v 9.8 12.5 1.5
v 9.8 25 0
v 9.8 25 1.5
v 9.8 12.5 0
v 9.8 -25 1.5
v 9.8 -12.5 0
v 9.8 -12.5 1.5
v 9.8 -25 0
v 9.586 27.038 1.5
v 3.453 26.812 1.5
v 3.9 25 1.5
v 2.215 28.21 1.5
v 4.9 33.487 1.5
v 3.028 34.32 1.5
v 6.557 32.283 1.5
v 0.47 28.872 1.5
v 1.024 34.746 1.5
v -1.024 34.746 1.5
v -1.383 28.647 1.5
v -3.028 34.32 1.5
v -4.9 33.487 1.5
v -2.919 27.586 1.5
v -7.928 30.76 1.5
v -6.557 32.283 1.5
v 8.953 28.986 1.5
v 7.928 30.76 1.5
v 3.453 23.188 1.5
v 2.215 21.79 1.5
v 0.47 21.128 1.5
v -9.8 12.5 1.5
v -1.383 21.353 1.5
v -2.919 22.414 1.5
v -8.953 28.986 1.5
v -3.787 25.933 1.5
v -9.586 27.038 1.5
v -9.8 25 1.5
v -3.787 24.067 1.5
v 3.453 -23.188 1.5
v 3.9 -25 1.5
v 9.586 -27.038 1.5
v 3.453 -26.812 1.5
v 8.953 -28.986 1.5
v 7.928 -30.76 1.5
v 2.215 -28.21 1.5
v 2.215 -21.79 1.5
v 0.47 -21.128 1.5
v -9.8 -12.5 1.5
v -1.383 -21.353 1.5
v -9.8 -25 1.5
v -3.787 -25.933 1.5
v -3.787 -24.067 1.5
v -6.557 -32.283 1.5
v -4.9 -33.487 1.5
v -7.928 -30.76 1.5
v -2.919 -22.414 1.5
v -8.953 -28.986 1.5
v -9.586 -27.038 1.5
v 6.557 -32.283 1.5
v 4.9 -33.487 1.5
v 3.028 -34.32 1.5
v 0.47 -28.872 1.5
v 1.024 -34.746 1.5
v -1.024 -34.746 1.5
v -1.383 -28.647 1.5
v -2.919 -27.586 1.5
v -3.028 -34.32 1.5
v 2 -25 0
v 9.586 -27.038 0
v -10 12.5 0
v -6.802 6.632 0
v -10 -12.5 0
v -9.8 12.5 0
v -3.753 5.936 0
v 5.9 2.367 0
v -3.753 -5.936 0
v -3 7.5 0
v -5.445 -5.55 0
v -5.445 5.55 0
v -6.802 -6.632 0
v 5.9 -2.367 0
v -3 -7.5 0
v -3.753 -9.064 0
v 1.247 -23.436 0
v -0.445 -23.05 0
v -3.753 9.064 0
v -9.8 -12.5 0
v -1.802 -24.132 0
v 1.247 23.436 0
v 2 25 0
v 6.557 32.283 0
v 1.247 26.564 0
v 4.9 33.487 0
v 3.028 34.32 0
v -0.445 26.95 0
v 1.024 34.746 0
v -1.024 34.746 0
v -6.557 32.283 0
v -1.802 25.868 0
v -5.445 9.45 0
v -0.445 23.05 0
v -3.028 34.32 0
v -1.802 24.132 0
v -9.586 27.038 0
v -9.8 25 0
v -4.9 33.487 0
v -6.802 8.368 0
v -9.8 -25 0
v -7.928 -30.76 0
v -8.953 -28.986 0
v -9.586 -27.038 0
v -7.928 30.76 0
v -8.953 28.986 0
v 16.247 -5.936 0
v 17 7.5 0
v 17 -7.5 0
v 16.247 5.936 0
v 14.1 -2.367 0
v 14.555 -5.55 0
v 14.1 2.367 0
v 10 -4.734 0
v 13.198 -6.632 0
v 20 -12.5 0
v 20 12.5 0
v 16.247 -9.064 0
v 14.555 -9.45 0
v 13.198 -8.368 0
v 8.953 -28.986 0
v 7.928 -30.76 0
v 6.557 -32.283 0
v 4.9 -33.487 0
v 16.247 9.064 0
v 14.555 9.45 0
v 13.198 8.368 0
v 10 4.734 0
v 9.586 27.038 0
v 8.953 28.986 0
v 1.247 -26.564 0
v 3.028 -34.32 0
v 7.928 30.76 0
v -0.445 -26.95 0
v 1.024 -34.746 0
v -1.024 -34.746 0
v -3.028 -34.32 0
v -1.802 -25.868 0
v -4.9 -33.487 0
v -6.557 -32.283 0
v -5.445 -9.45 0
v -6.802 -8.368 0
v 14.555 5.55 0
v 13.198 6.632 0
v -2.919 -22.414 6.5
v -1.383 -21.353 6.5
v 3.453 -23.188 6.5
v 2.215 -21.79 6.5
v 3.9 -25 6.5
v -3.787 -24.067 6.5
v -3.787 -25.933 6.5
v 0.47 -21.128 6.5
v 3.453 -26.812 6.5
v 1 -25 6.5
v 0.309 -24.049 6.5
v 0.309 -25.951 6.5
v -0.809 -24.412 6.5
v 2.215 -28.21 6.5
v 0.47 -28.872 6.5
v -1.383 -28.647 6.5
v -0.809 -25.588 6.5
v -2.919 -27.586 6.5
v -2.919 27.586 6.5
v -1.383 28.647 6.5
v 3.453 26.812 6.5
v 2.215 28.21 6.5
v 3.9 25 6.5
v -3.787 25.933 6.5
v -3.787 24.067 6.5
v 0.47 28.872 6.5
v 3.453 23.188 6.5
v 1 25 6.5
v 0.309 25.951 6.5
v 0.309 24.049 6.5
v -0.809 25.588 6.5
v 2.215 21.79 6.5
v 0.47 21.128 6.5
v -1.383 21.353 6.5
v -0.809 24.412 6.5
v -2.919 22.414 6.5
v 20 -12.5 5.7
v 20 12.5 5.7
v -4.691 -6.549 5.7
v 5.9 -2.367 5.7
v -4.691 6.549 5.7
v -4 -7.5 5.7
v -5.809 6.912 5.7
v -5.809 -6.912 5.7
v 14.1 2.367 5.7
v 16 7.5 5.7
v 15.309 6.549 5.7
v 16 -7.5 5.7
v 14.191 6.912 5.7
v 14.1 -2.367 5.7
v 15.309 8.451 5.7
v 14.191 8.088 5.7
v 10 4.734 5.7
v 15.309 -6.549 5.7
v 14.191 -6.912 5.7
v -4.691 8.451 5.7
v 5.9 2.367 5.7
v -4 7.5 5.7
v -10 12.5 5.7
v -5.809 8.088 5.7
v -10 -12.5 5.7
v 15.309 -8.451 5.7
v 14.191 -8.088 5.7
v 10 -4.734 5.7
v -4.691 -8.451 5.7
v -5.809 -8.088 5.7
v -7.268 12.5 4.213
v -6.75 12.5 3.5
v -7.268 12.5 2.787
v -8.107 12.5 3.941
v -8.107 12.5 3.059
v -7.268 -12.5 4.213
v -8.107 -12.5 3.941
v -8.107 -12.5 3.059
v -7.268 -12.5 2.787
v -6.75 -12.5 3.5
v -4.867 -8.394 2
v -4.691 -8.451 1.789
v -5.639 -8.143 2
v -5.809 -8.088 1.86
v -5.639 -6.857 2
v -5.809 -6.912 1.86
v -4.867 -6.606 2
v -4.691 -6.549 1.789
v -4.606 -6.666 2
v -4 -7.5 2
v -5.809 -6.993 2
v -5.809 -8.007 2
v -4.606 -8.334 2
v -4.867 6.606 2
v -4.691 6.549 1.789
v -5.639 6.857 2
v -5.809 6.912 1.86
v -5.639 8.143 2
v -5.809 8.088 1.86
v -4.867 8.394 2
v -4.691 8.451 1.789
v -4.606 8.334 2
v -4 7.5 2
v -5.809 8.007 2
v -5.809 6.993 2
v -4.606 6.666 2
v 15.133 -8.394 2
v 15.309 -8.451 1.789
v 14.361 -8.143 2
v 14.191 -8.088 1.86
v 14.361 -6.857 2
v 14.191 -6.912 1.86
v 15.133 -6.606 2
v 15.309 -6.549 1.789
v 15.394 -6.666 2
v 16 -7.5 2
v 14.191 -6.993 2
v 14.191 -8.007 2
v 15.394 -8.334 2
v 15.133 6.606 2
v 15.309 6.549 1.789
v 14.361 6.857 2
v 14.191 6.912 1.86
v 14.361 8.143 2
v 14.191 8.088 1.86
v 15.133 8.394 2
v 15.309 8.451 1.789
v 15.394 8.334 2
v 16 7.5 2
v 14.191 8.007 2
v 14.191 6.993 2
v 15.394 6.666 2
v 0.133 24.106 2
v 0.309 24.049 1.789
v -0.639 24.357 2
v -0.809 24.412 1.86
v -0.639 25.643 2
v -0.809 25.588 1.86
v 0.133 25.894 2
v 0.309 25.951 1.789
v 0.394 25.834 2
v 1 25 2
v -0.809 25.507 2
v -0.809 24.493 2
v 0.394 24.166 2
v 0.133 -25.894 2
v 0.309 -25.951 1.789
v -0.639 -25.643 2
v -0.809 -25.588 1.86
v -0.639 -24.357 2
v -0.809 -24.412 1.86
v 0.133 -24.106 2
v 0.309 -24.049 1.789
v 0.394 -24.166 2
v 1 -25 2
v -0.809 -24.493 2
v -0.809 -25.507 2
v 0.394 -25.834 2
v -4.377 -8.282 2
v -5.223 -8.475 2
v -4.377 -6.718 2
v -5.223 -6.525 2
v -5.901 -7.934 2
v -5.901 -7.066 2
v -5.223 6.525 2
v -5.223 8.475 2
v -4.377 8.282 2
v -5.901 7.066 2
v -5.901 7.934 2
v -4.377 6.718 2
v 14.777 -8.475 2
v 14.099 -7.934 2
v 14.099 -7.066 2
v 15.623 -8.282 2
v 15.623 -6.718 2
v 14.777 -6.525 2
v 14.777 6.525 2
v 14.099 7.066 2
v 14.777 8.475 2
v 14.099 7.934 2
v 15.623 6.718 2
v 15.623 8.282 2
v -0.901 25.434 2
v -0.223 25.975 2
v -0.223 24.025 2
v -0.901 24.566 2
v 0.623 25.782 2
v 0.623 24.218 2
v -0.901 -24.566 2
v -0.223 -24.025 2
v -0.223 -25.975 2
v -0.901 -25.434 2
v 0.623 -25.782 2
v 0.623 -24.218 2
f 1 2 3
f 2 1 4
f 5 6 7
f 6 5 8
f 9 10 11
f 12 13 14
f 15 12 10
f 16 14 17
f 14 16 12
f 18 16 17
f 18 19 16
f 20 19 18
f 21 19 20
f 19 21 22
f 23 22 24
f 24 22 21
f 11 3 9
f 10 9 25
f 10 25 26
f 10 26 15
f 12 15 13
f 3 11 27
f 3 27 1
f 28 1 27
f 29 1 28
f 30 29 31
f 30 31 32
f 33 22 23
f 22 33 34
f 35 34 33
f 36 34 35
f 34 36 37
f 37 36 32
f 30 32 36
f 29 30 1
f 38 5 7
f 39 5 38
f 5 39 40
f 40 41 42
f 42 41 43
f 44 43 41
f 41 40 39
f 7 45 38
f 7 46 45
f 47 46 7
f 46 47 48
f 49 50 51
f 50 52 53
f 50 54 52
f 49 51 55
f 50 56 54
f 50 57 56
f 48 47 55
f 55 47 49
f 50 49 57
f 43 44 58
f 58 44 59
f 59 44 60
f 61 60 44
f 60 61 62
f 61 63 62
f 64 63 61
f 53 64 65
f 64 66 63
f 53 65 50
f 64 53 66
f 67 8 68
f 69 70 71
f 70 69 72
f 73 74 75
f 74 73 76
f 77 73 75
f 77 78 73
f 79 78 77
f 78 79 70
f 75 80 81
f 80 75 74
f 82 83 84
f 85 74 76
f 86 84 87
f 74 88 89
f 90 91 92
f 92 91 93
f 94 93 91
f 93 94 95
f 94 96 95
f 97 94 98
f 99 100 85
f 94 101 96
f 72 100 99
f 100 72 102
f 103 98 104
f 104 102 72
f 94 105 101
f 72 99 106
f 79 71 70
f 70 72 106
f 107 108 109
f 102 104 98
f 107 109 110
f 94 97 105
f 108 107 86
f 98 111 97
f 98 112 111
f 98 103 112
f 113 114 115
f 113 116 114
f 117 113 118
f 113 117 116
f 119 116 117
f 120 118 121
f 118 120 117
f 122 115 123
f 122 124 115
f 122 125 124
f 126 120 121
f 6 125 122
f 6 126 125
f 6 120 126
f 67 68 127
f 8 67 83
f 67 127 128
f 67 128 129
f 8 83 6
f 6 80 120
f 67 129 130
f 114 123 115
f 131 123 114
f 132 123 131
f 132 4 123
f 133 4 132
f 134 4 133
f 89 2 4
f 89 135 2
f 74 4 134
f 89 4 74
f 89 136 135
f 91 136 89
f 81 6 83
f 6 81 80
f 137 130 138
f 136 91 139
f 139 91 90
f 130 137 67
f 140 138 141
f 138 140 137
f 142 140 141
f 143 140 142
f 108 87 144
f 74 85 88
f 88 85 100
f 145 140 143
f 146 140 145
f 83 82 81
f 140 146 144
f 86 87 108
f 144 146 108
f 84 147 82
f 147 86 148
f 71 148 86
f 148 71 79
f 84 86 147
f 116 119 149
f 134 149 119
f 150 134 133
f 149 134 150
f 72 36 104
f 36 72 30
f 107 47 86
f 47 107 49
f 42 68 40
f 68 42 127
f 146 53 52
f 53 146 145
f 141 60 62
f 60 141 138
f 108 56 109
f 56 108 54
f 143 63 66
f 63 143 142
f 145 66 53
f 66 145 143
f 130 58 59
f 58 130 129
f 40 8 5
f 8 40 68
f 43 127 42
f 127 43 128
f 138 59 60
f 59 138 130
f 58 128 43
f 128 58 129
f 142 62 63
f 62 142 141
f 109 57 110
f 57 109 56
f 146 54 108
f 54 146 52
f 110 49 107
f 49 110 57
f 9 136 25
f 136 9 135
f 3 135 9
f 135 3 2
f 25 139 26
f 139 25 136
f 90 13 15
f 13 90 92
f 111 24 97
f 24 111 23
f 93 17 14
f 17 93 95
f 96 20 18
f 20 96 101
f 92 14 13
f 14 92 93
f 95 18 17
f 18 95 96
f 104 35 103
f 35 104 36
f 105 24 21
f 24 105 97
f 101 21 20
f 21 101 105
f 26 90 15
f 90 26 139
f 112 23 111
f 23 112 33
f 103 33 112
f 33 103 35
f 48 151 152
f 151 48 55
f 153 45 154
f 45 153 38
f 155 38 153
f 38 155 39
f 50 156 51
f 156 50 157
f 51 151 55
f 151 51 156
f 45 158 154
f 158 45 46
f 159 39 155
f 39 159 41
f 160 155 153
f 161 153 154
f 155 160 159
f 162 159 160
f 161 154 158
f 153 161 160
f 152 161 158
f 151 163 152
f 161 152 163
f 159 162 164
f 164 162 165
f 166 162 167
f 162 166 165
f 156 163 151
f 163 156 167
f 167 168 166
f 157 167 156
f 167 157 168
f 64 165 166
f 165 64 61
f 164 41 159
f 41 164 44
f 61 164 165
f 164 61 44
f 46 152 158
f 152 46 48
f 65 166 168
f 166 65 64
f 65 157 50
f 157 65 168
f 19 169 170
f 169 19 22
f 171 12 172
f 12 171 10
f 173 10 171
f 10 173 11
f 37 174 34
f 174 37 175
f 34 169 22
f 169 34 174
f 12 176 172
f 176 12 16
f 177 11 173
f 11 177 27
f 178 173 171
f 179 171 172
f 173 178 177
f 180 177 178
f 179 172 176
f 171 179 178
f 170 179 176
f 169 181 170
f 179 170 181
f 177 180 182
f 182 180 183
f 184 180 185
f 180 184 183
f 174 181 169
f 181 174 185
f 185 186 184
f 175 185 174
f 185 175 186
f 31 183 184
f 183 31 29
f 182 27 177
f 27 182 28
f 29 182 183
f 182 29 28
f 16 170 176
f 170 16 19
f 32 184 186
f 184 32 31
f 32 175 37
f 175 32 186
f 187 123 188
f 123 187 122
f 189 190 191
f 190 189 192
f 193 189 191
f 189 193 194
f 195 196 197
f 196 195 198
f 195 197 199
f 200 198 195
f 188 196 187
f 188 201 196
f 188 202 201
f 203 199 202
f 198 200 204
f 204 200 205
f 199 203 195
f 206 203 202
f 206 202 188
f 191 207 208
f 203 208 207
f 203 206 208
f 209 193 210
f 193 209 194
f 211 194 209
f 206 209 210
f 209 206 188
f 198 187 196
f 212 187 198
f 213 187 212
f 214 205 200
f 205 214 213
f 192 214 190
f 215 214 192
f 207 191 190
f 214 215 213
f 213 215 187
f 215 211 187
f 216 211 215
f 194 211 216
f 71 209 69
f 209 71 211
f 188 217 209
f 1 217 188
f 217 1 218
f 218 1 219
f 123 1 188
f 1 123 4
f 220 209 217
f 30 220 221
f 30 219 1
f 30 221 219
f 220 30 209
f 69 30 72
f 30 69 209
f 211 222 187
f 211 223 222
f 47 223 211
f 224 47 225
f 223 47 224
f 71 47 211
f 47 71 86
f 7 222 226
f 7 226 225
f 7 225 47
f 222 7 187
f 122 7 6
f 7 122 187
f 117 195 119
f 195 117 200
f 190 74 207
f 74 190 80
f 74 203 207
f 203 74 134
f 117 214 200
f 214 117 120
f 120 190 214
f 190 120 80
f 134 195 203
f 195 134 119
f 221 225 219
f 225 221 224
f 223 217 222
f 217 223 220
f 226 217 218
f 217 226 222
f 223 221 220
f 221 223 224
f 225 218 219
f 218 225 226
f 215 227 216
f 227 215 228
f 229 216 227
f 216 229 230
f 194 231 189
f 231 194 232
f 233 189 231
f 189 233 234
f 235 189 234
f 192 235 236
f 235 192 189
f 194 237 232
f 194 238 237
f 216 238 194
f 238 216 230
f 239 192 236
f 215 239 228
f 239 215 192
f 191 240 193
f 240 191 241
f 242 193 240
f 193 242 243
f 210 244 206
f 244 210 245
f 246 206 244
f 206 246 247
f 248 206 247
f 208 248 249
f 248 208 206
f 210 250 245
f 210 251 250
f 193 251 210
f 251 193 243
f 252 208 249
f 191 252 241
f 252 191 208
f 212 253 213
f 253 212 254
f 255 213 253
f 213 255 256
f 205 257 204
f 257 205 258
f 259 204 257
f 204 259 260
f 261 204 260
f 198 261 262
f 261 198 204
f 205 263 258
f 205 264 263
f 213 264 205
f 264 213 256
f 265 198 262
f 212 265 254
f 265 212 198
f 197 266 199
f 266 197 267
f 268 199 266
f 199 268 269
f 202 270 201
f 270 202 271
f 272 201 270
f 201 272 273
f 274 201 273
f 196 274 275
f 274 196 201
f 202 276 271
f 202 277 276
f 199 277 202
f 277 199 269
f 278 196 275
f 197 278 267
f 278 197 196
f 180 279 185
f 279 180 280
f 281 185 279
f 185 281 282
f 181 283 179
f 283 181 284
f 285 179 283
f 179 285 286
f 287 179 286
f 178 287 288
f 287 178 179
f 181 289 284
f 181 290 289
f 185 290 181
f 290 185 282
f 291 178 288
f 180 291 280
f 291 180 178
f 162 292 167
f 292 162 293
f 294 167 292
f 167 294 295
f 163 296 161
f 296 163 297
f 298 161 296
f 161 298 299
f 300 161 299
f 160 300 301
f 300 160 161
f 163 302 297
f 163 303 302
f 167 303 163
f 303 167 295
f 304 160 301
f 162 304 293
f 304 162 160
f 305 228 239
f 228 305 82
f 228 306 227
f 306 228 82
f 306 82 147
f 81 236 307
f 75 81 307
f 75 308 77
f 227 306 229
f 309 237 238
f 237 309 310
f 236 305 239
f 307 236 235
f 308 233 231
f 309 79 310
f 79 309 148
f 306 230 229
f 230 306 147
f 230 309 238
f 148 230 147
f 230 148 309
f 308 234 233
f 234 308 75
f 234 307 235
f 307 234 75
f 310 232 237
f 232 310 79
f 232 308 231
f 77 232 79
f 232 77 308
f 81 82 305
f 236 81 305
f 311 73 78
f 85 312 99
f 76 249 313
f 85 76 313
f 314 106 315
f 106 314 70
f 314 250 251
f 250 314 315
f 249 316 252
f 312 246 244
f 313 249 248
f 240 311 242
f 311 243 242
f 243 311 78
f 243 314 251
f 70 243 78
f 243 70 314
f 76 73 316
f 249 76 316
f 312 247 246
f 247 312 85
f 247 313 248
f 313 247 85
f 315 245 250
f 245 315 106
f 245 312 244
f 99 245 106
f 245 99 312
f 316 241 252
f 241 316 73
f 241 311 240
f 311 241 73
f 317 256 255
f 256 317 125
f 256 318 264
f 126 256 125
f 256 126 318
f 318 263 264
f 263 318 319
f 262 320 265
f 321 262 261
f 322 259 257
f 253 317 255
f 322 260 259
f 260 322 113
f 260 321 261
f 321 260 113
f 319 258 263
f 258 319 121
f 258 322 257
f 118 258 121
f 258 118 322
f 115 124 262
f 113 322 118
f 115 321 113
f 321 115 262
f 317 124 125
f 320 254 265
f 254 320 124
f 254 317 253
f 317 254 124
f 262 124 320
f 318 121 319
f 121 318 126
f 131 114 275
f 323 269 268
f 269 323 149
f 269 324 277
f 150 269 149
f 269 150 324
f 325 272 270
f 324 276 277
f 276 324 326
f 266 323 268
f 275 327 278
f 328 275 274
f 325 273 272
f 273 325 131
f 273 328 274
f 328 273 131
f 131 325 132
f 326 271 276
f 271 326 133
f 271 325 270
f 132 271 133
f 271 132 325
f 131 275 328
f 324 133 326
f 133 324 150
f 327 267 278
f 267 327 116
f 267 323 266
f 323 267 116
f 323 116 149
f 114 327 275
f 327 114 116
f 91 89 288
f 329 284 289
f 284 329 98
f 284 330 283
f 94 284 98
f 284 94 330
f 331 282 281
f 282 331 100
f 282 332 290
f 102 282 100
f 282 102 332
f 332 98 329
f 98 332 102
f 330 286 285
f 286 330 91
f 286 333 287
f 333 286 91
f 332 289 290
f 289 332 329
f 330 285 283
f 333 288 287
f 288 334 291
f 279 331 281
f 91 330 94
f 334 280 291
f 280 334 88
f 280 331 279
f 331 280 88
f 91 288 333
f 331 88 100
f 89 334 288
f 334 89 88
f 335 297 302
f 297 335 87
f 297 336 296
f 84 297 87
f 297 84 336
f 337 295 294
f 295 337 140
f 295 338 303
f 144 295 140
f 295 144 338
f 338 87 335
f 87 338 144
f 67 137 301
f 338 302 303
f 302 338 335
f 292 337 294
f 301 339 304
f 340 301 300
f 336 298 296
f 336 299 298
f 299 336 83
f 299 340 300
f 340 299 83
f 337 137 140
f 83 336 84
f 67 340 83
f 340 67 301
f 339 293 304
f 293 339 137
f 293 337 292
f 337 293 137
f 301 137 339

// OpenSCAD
// file: config_4x5.scad
/*
This is the base configuration file for the 4x5" format
# we are not using the exact ANSI measures, but slightly rounded measures for slight simplification
*/
vStabilizerTotal_h = 7;

// general tolerance
vTolerance = 0.2;

// sheet film and cassette measurements (roughly based on the ANSI measurements)
vFilmSheet_l = 127;
vFilmSheet_w = 102;
vCassette_l = 160; // A min
vCassette_w = 121; // B max
vCassette_h = 13.2; // C max
vLightTrap_l = 2; // M2
vLightTrap_w = vCassette_w;
vLightTrap_h = 1.5; // M1
vLightTrap_offsetX = 141; // G max
vFilmWindow_l = 121;
vFilmWindow_w = 101;
vFilmWindow_offsetX = 16;
vGroundGlass_offsetZ = 5;

// Graflok
vGraflok_h = 6; // this is not the official measurement, just measured from a camera 

// lens board measures (we are using Wista/Technika-style lensboards)
vLensboard_l = 100;
vLensboard_w = 97;
vLensboard_h = 2;
vLensboard_offsetX = -(vLensboard_l+3)/2; // caution: we have an asymetric offset!
vLensboard_offsetY = -vLensboard_w/2;
vLensboardHole_d = 85;
vLensboardLighttrap_d = 89;
vLensboardLighttrap_h = 1+vTolerance;

// bellows frame measures - the bellows frame design is derived from standardcameras.com
// back frame
vBellowsBackInner_l = 144; //???? check and replace with the measurement from your bellows!
vBellowsBackInner_w = vBellowsBackInner_l;
vBellowsBackOuter_l = vBellowsBackInner_l+1;
vBellowsBackOuter_w = vBellowsBackOuter_l;

vBellowsBackFrameOuter_l = 159;
vBellowsBackFrameOuter_w = vBellowsBackFrameOuter_l;
vBellowsBackFrameOuter_h = 7;
vBellowsBackFrameInner_l = 135;
vBellowsBackFrameInner_w = vBellowsBackFrameInner_l;
vBellowsBackFrameInner_h = 5;

vBellowsBackLightTrapOuter_l = vBellowsBackFrameInner_l+2*2;
vBellowsBackLightTrapOuter_w = vBellowsBackLightTrapOuter_l;
vBellowsBackLightTrap_h = 3;

vBellowsBackFrameScrewHole_d = 2;
vBellowsBackFrameScrewHole_h = 10;
vBellowsBackFrameScrewHole_offsetXY = 70;
vBellowsBackFrameScrewHole_offsetZ = vBellowsBackFrameOuter_h/2;

// front frame
vBellowsFrontInner_l = 94; //???? check and replace with the measurement from your bellows!
vBellowsFrontInner_w = vBellowsFrontInner_l;
vBellowsFrontOuter_l = vBellowsFrontInner_l+1;
vBellowsFrontOuter_w = vBellowsFrontOuter_l;

vBellowsFrontFrameOuter_l = 104;
vBellowsFrontFrameOuter_w = vBellowsFrontFrameOuter_l;
vBellowsFrontFrameOuter_h = 7;
vBellowsFrontFrameInner_l = 82;
vBellowsFrontFrameInner_w = vBellowsFrontFrameInner_l;
vBellowsFrontFrameInner_h = 5;

vBellowsFrontLightTrapOuter_l = vBellowsFrontFrameInner_l+2*2;
vBellowsFrontLightTrapOuter_w = vBellowsFrontLightTrapOuter_l;
vBellowsFrontLightTrap_h = 0;

vBellowsFrontFrameScrewHole_d = 2;
vBellowsFrontFrameScrewHole_h = 10;
vBellowsFrontFrameScrewHole_offsetXY = 40;
vBellowsFrontFrameScrewHole_offsetZ = vBellowsFrontFrameOuter_h/2;

// body dimensions
vWall_strength = 5;
vBodyOuter_l = 185; // make sure this is at least 4*vWall_strength larger than vBellowsBackFrameOuter_l!
vBodyOuter_w = 170; // make sure this is at least 2*vWall_strength larger than vBellowsBackFrameOuter_l!
vBodyOuter_h = 65;
vBodyEdge_r = vWall_strength;

// we will center our model on the Y axis and on the center of the bellows frame
// at least for the 4x5 version, we have to do an asymetric offset of 2.5mm on the X-axis 
vAsymOffsetX = -2.5;  

// back plate
vBackPlateLength = 160; // we will probably use about the same size as the bellows back frame
vBackPlateStrength = vWall_strength;

// hinges for front lid
vHingeInnerDistance = 100;
vHingeBaseWidth = 20;
vHingeHole = 5;

// lid lock measures
vLidLockBase_d = 8;
vLidLockHole_distance = 70;

// rail dimensions
vLowerRail_w = 90;
vUpperRail_w = vLowerRail_w;

// cutout for stop indents
vStopIndent_l = 4;
vStopIndent_h = 5;
vStopIndentDistance = 25; // shorter than 25 is not necessary
vStopIndent_offsetX = 20; // don't go shorter than 20 if you intend to use a 90mm lens!

// for all dovetails we use a base width of 5mm and a base height of 5mm
// we are applying tolerances to the inner AND outer part of a dovetail, in width and height
vDoveTail_w = 5;
vDoveTail_h = 5;
vDoveTail_tolerance = 0.2;

// front standard carrier / slider
// width is depending on vUpperRail_w
vSliderBase_w = vUpperRail_w + (4*vDoveTail_w);
vSliderBase_l = 40; // make sure to have enough space in the body.


// lever plate 
vLeverPlateBase_w = vUpperRail_w - (8*vDoveTail_w);
vLeverPlateBlock_w = 25;
vLeverPlateBlock_l = vSliderBase_l-(2*vDoveTail_w);

vFrontStandard_h = 130;
vFrontStandardSlot_h = vFrontStandard_h - 30;

// lensboard carrier
vFrontPlate_length = vSliderBase_w+6; // vSliderBase_w is a bit too tight for 4x5", so there we will add 5mm, for 5x7 vSliderBase_w is OK to get a squared lensboard carrier
vFrontPlate_width = vSliderBase_w; //vFrontPlate_length;
vFrontPlate_height = 16;
vEdgeCutCylinder = floor(sqrt(2*pow(vFrontPlate_width,2)))-5;

vTiltDovetailBase_d1 = 30;
vTiltDovetailBase_d2 = vTiltDovetailBase_d1+(2*vDoveTail_w);
vTiltDovetailBaseBlock_d = vTiltDovetailBase_d1+(4*vDoveTail_w);

vTiltDovetail_d1 = vTiltDovetailBase_d1-vTolerance;
vTiltDovetail_d2 = vTiltDovetailBase_d2-vTolerance;
vTiltDovetail_h = vDoveTail_w-vTolerance;

vTiltDovetailCutout_d1 = vTiltDovetailBase_d2+vTolerance;
vTiltDovetailCutout_d2 = vTiltDovetailBase_d1+vTolerance;

vAxisHole_d = 10+vTolerance;
vAxisHole_h = vDoveTail_w+vTolerance;

vTiltLockBolt_d = 12;
vTiltLockBolt_h = 14;
vTiltLockBoltHole_d = 8;
vTiltLockBoltHole_h = vTiltLockBolt_h;

vTiltHeight = 50;
vTiltRadius = vFrontPlate_length/2;
vTiltAngleMinus = -7;
vTiltAnglePlus = 7;
vTiltAxis_d = 10-vTolerance;

// focusing rod
vFocusingRod_d = 6;
vFocusingKnob_d = 25;
vFocusingKnob_h = 20;

// stabilizer measures (just the outer measures of our stabilizer block, not the tripod slider)
vStabilizerBase_l = 135;
vStabilizerBase_w = 90;  
vStabilizerBase_h = 7;
vStabilizerDovetailBase_w = 50;
// screw holes for the stabilizer
vLidHoleCount_x = 4;
vLidHoleDist_x = 35;
vLidHoleCount_y = 2;
vLidHoleDist_y = 60;


// screw diameters, length is individually set
vScrew1Hole_d = 3;
vScrew1ThreadHole_d = 2.2;
vScrew2Hole_d = 2;
vScrew2ThreadHole_d = 1.4;


 
// file: modules.scad
/*
This is a collection of the modules which are used heavily within the whole project.
Almost all parts rely on the modules to remain "as is", especially regarding their current orientation.
So please act very carefully here, otherwise you may screw up the complete design!

*/
include <baseconfig.scad>;


// roof module - this is heavily used for dovetail cutouts
// please keep as is
module roof(l, w, h){
    polyhedron(
        points=[
            [0,0,0],
            [l,0,0],
            [l,w,0],
            [0,w,0],
            [0,w/2,h],
            [l,w/2,h]
            ],
        faces=[
            [0,1,2,3],
            [0,4,1],
            [1,4,5,2],
            [2,5,3],
            [3,5,4,0]
            ]
            );
    };

// a wedge module - this is heavily used for cutting edges
// please keep as is    
module wedge(l, w, h) {
    polyhedron(
            points=[
                [0,0,0],
                [l,0,0],
                [l,w,0],
                [0,w,0],
                [0,0,h],
                [l,0,h]
            ],
            faces=[
                [0,3,2,1],
                [0,1,5,4],
                [1,2,5],
                [2,3,4,5],
                [3,0,4]
            ]
    );
   };

// simple tube module.   
module tube(d1, d2, h) {
    difference() {
        cylinder(d=d1, h=h);
        cylinder(d=d2, h=h);
        };
    };

// mainly used for making holes for countersunk screws
// please keep as is    
module countersunk_screw(vScrew_d, vScrew_l){
    union(){
    cylinder(d=vScrew_d, h=vScrew_l);
    cylinder(d1=vScrew_d*2, d2=0, h=vScrew_d);
    };
};

// module for making hexagons, e.g. hex nuts. kw is the key width
// please keep as is
module hex(kw, h) {
	render()
        translate([0, 0, h/2])
            intersection_for(a = [0, 120, 240]) {
                rotate([0, 0, a])
                    cube([kw, 3 * kw, h], true);
                }
}


// Heatset insert
// d: Thread diameter
// od: Outer diameter
// l: Total length
module insert(d, od, l)
{
    echo(Insert = d, od, l);
    difference() {
        cylinder(l, d=od, $fn=15);
        translate([0, 0, -0.5]) cylinder(l+1, d=d, $fn=15);
        };
}

module insert_m2()
{
    color("gold") insert(2, vInsertM2Size_d, vInsertM2Depth_h);
}

module insert_m3()
{
    color("gold") insert(3, vInsertM3Size_d, vInsertM3Depth_h);
}

module insert_m5()
{
    color("gold") insert(5, vInsertM5Size_d, vInsertM5Depth_h);
}

// Countersunk screw, metric, for display
// Example: https://www.aliexpress.com/item/1005007838338973.html
module screw_cs(l, d=3, dk=6, s=2, t=1) {
    // l: total length (including head) in mm
    // d: thread diameter (eg 3 for M3)
    // dk: max head diameter
    // s: hex socket flat-to-flat size
    // t: hex socket depth
    echo(CountersunkScrew = d, l);
    difference() {
        union() {
            cylinder(h=l, r=d/2, $fn=15);
            cylinder(h=(dk-d)/2, r1=dk/2, r2=d/2, $fn=15);
            }
        cylinder(h=t, r=s/2*2/sqrt(3), $fn=6);
    }
}

module screw_m3_cs(l) {
    color("silver") screw_cs(l, d=3, dk=6, s=2, t=1);
}

module screw_m2_cs(l) {
    color("silver") screw_cs(l, d=2, dk=3.8, s=1.5, t=0.75);
}
module screw_m5_cs(l) {
    color("silver") screw_cs(l, d=5, dk=9.5, s=3, t=1.6);
}

// Button head screw, metric, for display
// Example: https://www.aliexpress.com/item/32967225441.html
module screw_bh(l, d=3, k=1.5, dk=5.5, s=2, t=1) {
    // l: shaft length (NOT including head) in mm
    // d: thread diameter (eg 3 for M3)
    // k: head depth
    // dk: head max diameter
    // s: hex socket flat-to-flat size
    // t: hex socket depth
    echo(BallheadScrew = d, l);
    difference() {
        union() {
            translate([0, 0, k]) cylinder(h=l, r=d/2, $fn=15);
            difference() {
                translate([0, 0, k]) intersection() {
                    sphere(d=dk, $fn=15);
                    translate([-dk/2, -dk/2, -dk]) cube(dk);
                }
                translate([-dk/2, -dk/2, -dk]) cube(dk);
            }
        }
        cylinder(h=t, r=s/2*2/sqrt(3), $fn=6);
    }
}

module screw_m2_bh(l) {
    color("silver") screw_bh(l, d=2, dk=3.4, s=1.175, t=0.6);
}

module screw_m3_bh(l) {
    color("silver") screw_bh(l, d=3, dk=5.7, s=2, t=1);
}


module nut_m5() {
    echo(Nut = 5);
    difference() {
        rotate([0, 0, 30]) cylinder(h=3.9, d=8*2/sqrt(3), $fn=6);
        cylinder(h=5, d=5, $fn=15);
        }
    }
    
    
module thumbscrew(bolt_d, bolt_dk, screw_d, screw_h, n_knurls, knurl_d, knurl_f) {
    // bolt_d:  central bolt diameter
    // bolt_dk: bolt head max diameter
    // screw_d: thumbscrew outer diameter
    // screw_h: thumbscrew height
    // n_knurls: number of knurls
    
    min_knurl_offset = screw_d/2 - knurl_d;
    max_knurl_offset = screw_d/2 + knurl_d;
    knurl_offset = min_knurl_offset + knurl_f*(max_knurl_offset - min_knurl_offset);
    
    difference()
    {
        union()
        {
            translate([0, 0, 1]) cylinder(screw_h-2, d=screw_d);
            cylinder(1, d1=screw_d-1, d2=screw_d);
            translate([0, 0, screw_h-1]) cylinder(1, d1=screw_d, d2=screw_d-1);
        }
        cylinder(screw_h, d=bolt_d);
        cylinder(bolt_dk/2, d1=bolt_dk, d2=0);
        for (i = [1:n_knurls])
        {
            rotate([0, 0, i*360/(n_knurls)]) translate([knurl_offset, 0, 0]) cylinder(screw_h, d=knurl_d);
        }
    }
}

module thumbscrew_m5(screw_d, screw_h, n_knurls, knurl_d, knurl_f) {
    thumbscrew(5, 9.5, screw_d, screw_h, n_knurls, knurl_d, knurl_f);
}


module t6_flange_coupler() {
    // T6 flange coupler
    // Example: https://www.aliexpress.com/item/1005008049363389.html
    echo(FlangeCoupler = 6);
    difference() {
        union() {
            translate([0, 0, 2]) cylinder(h=10, d=10);
            cylinder(h=2, d=22);
        }
        cylinder(h=12, d=6);
        translate([0, 15, 7]) rotate([90, 0, 0]) cylinder(h=30, d=3);
        for (i = [0:3]) {
            rotate([0, 0, 45+90*i]) translate([-8, 0, 0]) cylinder(h=2, d=3);
        }
    }
}


module AXK0619_thrust_bearing() {
    echo(ThrustBearing = "AXK0619");
    difference() {
        cylinder(h=4, d=19);
        cylinder(h=4, d=6);
    }
}


module t6_lead_screw(l) {
    echo(LeadScrewT6 = l);
    color("silver") cylinder(h=l, d=6);
}

module t6_lead_screw_nut() {
    echo("LeadScrewT6Nut");
    intersection()
    {
        difference() {
            union() {
                cylinder(h=15, d=12);
                translate([0, 0, 1.5]) cylinder(h=3.5, d=24);
            }
            cylinder(h=15, d=6);
        }  
        translate([-50, -12.5/2, -50]) cube([100, 12.5, 100]);
    }
}

module m5_rod(l) {
    echo(ThreadedRodM5 = l);
    color("silver") cylinder(h=l, d=5);
}


module screw_m3_grub(l) {
    echo(GrubScrew = 3, l);
    cylinder(h=l, d=3, $fn=15);
}
// file: baseconfig.scad
/*
Here we define some variables which are independent from the camera format
*/


// some generic variables

// we are including a format specific configuration sheet - but make sure to include only one!

include <config_4x5.scad>;
// include <config_5x7.scad>;
// include <config_8x10.scad>;

// Arca Swiss tripod plate
// caution: some Arca Swiss compatible tripod heads may have slight variations
// vArca_length = xx; // the length is irrelevant here
vArca_width = 38;
vArca_height = 7;
vArcaBase_cutout = 4;
vArcaBase_height = 1.5;
// main file
// loading the base configuration
include <baseconfig.scad>;

// some modules such as hex, countersunk screws, roof, wedge are available in a module file
use <modules.scad>;


module pulling_lever_plate() {

vBoltPlate_length = 20-(2*vTolerance);
vBoltPlate_width = vLeverPlateBase_w; // caution: this is just the width without the radius!
vBoltPlate_height = 1.5;
vBoltPlate_offsetX = -vBoltPlate_length/2;
vBoltPlate_offsetY = -vBoltPlate_width/2;
vBoltPlate_offsetZ = 0;

vBolt_diameter = 8-vTolerance;
vBolt_height = vBoltPlate_height+5;
vBolt_offsetX = 0;
vBolt_offsetY = vBoltPlate_offsetY;
vBolt_offsetZ = 0;

vCentralBlock_length = vLeverPlateBlock_l;
vCentralBlock_width = vLeverPlateBlock_w;
vCentralBlock_height = vBoltPlate_height+4+vTolerance;
vCentralBlock_offsetX = vLeverPlateBlock_l-vSliderBase_l; // this should result in a negative offset
vCentralBlock_offsetY = -vCentralBlock_width/2;
vCentralBlock_offsetZ = 0;

vSpringHole_d = 1.5;
vSpringHole_h = vCentralBlock_width;
vSpringHole_offsetX = vCentralBlock_offsetX+2.5;
vSpringHole_offsetY = vCentralBlock_width/2;
//vSpringHole_offsetZ = vCentralBlock_height-vSpringHole_d;
vSpringHole_offsetZ = 3.5;

vCentralHole_d = 12;
vCentralHole_h = vBoltPlate_height;
vCentralHole_offsetX = 10;
vCentralHole_offsetY = 0;
vCentralHole_offsetZ = 0;

vCentralScrewHexNut_keywidth = 8+vTolerance;
vCentralScrewHexNut_height = 6;
vCentralScrewHexNut_offsetX = 10;
vCentralScrewHexNut_offsetY = 0;
vCentralScrewHexNut_offsetZ = 0;

vLeverBoltScrewHole_d1 = 4;
vLeverBoltScrewHole_d2 = 2;
vLeverBoltScrewHole_h = vBolt_height;
vLeverBoltScrewHole_f = vLeverBoltScrewHole_d1/2;
vLeverBoltScrewHole_offsetX = 0;
vLeverBoltScrewHole_offsetY = vBolt_offsetY;
vLeverBoltScrewHole_offsetZ = 0;

// lever plate screw holes
vLeverPlateScrewHole_d1 = 4;
vLeverPlateScrewHole_d2 = 2;
vLeverPlateScrewHole_f = vLeverPlateScrewHole_d1/2;
vLeverPlateScrewHole_h = vBolt_height;
vLeverPlateScrewHole_offsetX1 = -vDoveTail_w;
vLeverPlateScrewHole_offsetX2 = 3*vDoveTail_w;
vLeverPlateScrewHole_offsetY = (vLeverPlateBlock_w/2)-vDoveTail_w;
vLeverPlateScrewHole_offsetZ = 0;


difference(){
    union(){
        // front slider base
        translate([vBoltPlate_offsetX, vBoltPlate_offsetY, vBoltPlate_offsetZ])
            cube([vBoltPlate_length, vBoltPlate_width, vBoltPlate_height]);
        
        // rounded sides
        translate([vBolt_offsetX, vBolt_offsetY, vBolt_offsetZ])
            cylinder(h=vBoltPlate_height, d=vBoltPlate_length);
        
        translate([vBolt_offsetX, -vBolt_offsetY, vBolt_offsetZ])
            cylinder(h=vBoltPlate_height, d=vBoltPlate_length);
         
        // bolts
        translate([vBolt_offsetX, vBolt_offsetY, vBolt_offsetZ])
            cylinder(h=vBolt_height, d=vBolt_diameter);
        
        translate([vBolt_offsetX, -vBolt_offsetY, vBolt_offsetZ])
            cylinder(h=vBolt_height, d=vBolt_diameter);
        
        // central plate
        translate([vCentralBlock_offsetX, vCentralBlock_offsetY, vCentralBlock_offsetZ])
            cube([vCentralBlock_length, vCentralBlock_width, vCentralBlock_height]);
        

    };
    translate([vCentralScrewHexNut_offsetX, vCentralScrewHexNut_offsetY, vCentralScrewHexNut_offsetZ])
        hex(vCentralScrewHexNut_keywidth, vCentralScrewHexNut_height);
    
    // spring hole in central block
    translate([vSpringHole_offsetX, vSpringHole_offsetY, vSpringHole_offsetZ])
        rotate([90, 0, 0])
            cylinder(d=vSpringHole_d, h=vSpringHole_h );
    
    // lever plate screw holes
    translate([vLeverPlateScrewHole_offsetX1, -vLeverPlateScrewHole_offsetY, vLeverPlateScrewHole_offsetZ])
        cylinder(d=vLeverPlateScrewHole_d2, h=vLeverPlateScrewHole_h);
    translate([vLeverPlateScrewHole_offsetX1, +vLeverPlateScrewHole_offsetY, vLeverPlateScrewHole_offsetZ])
        cylinder(d=vLeverPlateScrewHole_d2, h=vLeverPlateScrewHole_h);
    translate([vLeverPlateScrewHole_offsetX2, -vLeverPlateScrewHole_offsetY, vLeverPlateScrewHole_offsetZ])
        cylinder(d=vLeverPlateScrewHole_d2, h=vLeverPlateScrewHole_h);
    translate([vLeverPlateScrewHole_offsetX2, +vLeverPlateScrewHole_offsetY, vLeverPlateScrewHole_offsetZ])
        cylinder(d=vLeverPlateScrewHole_d2, h=vLeverPlateScrewHole_h);
    
    // lever bolt screw holes
    translate([vLeverBoltScrewHole_offsetX, -vLeverBoltScrewHole_offsetY, vLeverBoltScrewHole_offsetZ])
        cylinder(d=vLeverBoltScrewHole_d2, h=vLeverBoltScrewHole_h);
    translate([vLeverBoltScrewHole_offsetX, +vLeverBoltScrewHole_offsetY, vLeverBoltScrewHole_offsetZ])
        cylinder(d=vLeverBoltScrewHole_d2, h=vLeverBoltScrewHole_h);
        
        
        
    // bevels for all screw holes
    // lever plate screw holes
    translate([vLeverPlateScrewHole_offsetX1, -vLeverPlateScrewHole_offsetY, vLeverPlateScrewHole_offsetZ])
        cylinder(d1=vLeverPlateScrewHole_d1, d2=vLeverPlateScrewHole_d2, h=vLeverPlateScrewHole_f);
    translate([vLeverPlateScrewHole_offsetX1, +vLeverPlateScrewHole_offsetY, vLeverPlateScrewHole_offsetZ])
        cylinder(d1=vLeverPlateScrewHole_d1, d2=vLeverPlateScrewHole_d2, h=vLeverPlateScrewHole_f);
    translate([vLeverPlateScrewHole_offsetX2, -vLeverPlateScrewHole_offsetY, vLeverPlateScrewHole_offsetZ])
        cylinder(d1=vLeverPlateScrewHole_d1, d2=vLeverPlateScrewHole_d2, h=vLeverPlateScrewHole_f);
    translate([vLeverPlateScrewHole_offsetX2, +vLeverPlateScrewHole_offsetY, vLeverPlateScrewHole_offsetZ])
        cylinder(d1=vLeverPlateScrewHole_d1, d2=vLeverPlateScrewHole_d2, h=vLeverPlateScrewHole_f);
    
    // lever bolt screw holes
    translate([vLeverBoltScrewHole_offsetX, -vLeverBoltScrewHole_offsetY, vLeverBoltScrewHole_offsetZ])
        cylinder(d1=vLeverBoltScrewHole_d1, d2=vLeverBoltScrewHole_d2, h=vLeverBoltScrewHole_f);
    translate([vLeverBoltScrewHole_offsetX, +vLeverBoltScrewHole_offsetY, vLeverBoltScrewHole_offsetZ])
        cylinder(d1=vLeverBoltScrewHole_d1, d2=vLeverBoltScrewHole_d2, h=vLeverBoltScrewHole_f);

    
};

};

pulling_lever_plate();
